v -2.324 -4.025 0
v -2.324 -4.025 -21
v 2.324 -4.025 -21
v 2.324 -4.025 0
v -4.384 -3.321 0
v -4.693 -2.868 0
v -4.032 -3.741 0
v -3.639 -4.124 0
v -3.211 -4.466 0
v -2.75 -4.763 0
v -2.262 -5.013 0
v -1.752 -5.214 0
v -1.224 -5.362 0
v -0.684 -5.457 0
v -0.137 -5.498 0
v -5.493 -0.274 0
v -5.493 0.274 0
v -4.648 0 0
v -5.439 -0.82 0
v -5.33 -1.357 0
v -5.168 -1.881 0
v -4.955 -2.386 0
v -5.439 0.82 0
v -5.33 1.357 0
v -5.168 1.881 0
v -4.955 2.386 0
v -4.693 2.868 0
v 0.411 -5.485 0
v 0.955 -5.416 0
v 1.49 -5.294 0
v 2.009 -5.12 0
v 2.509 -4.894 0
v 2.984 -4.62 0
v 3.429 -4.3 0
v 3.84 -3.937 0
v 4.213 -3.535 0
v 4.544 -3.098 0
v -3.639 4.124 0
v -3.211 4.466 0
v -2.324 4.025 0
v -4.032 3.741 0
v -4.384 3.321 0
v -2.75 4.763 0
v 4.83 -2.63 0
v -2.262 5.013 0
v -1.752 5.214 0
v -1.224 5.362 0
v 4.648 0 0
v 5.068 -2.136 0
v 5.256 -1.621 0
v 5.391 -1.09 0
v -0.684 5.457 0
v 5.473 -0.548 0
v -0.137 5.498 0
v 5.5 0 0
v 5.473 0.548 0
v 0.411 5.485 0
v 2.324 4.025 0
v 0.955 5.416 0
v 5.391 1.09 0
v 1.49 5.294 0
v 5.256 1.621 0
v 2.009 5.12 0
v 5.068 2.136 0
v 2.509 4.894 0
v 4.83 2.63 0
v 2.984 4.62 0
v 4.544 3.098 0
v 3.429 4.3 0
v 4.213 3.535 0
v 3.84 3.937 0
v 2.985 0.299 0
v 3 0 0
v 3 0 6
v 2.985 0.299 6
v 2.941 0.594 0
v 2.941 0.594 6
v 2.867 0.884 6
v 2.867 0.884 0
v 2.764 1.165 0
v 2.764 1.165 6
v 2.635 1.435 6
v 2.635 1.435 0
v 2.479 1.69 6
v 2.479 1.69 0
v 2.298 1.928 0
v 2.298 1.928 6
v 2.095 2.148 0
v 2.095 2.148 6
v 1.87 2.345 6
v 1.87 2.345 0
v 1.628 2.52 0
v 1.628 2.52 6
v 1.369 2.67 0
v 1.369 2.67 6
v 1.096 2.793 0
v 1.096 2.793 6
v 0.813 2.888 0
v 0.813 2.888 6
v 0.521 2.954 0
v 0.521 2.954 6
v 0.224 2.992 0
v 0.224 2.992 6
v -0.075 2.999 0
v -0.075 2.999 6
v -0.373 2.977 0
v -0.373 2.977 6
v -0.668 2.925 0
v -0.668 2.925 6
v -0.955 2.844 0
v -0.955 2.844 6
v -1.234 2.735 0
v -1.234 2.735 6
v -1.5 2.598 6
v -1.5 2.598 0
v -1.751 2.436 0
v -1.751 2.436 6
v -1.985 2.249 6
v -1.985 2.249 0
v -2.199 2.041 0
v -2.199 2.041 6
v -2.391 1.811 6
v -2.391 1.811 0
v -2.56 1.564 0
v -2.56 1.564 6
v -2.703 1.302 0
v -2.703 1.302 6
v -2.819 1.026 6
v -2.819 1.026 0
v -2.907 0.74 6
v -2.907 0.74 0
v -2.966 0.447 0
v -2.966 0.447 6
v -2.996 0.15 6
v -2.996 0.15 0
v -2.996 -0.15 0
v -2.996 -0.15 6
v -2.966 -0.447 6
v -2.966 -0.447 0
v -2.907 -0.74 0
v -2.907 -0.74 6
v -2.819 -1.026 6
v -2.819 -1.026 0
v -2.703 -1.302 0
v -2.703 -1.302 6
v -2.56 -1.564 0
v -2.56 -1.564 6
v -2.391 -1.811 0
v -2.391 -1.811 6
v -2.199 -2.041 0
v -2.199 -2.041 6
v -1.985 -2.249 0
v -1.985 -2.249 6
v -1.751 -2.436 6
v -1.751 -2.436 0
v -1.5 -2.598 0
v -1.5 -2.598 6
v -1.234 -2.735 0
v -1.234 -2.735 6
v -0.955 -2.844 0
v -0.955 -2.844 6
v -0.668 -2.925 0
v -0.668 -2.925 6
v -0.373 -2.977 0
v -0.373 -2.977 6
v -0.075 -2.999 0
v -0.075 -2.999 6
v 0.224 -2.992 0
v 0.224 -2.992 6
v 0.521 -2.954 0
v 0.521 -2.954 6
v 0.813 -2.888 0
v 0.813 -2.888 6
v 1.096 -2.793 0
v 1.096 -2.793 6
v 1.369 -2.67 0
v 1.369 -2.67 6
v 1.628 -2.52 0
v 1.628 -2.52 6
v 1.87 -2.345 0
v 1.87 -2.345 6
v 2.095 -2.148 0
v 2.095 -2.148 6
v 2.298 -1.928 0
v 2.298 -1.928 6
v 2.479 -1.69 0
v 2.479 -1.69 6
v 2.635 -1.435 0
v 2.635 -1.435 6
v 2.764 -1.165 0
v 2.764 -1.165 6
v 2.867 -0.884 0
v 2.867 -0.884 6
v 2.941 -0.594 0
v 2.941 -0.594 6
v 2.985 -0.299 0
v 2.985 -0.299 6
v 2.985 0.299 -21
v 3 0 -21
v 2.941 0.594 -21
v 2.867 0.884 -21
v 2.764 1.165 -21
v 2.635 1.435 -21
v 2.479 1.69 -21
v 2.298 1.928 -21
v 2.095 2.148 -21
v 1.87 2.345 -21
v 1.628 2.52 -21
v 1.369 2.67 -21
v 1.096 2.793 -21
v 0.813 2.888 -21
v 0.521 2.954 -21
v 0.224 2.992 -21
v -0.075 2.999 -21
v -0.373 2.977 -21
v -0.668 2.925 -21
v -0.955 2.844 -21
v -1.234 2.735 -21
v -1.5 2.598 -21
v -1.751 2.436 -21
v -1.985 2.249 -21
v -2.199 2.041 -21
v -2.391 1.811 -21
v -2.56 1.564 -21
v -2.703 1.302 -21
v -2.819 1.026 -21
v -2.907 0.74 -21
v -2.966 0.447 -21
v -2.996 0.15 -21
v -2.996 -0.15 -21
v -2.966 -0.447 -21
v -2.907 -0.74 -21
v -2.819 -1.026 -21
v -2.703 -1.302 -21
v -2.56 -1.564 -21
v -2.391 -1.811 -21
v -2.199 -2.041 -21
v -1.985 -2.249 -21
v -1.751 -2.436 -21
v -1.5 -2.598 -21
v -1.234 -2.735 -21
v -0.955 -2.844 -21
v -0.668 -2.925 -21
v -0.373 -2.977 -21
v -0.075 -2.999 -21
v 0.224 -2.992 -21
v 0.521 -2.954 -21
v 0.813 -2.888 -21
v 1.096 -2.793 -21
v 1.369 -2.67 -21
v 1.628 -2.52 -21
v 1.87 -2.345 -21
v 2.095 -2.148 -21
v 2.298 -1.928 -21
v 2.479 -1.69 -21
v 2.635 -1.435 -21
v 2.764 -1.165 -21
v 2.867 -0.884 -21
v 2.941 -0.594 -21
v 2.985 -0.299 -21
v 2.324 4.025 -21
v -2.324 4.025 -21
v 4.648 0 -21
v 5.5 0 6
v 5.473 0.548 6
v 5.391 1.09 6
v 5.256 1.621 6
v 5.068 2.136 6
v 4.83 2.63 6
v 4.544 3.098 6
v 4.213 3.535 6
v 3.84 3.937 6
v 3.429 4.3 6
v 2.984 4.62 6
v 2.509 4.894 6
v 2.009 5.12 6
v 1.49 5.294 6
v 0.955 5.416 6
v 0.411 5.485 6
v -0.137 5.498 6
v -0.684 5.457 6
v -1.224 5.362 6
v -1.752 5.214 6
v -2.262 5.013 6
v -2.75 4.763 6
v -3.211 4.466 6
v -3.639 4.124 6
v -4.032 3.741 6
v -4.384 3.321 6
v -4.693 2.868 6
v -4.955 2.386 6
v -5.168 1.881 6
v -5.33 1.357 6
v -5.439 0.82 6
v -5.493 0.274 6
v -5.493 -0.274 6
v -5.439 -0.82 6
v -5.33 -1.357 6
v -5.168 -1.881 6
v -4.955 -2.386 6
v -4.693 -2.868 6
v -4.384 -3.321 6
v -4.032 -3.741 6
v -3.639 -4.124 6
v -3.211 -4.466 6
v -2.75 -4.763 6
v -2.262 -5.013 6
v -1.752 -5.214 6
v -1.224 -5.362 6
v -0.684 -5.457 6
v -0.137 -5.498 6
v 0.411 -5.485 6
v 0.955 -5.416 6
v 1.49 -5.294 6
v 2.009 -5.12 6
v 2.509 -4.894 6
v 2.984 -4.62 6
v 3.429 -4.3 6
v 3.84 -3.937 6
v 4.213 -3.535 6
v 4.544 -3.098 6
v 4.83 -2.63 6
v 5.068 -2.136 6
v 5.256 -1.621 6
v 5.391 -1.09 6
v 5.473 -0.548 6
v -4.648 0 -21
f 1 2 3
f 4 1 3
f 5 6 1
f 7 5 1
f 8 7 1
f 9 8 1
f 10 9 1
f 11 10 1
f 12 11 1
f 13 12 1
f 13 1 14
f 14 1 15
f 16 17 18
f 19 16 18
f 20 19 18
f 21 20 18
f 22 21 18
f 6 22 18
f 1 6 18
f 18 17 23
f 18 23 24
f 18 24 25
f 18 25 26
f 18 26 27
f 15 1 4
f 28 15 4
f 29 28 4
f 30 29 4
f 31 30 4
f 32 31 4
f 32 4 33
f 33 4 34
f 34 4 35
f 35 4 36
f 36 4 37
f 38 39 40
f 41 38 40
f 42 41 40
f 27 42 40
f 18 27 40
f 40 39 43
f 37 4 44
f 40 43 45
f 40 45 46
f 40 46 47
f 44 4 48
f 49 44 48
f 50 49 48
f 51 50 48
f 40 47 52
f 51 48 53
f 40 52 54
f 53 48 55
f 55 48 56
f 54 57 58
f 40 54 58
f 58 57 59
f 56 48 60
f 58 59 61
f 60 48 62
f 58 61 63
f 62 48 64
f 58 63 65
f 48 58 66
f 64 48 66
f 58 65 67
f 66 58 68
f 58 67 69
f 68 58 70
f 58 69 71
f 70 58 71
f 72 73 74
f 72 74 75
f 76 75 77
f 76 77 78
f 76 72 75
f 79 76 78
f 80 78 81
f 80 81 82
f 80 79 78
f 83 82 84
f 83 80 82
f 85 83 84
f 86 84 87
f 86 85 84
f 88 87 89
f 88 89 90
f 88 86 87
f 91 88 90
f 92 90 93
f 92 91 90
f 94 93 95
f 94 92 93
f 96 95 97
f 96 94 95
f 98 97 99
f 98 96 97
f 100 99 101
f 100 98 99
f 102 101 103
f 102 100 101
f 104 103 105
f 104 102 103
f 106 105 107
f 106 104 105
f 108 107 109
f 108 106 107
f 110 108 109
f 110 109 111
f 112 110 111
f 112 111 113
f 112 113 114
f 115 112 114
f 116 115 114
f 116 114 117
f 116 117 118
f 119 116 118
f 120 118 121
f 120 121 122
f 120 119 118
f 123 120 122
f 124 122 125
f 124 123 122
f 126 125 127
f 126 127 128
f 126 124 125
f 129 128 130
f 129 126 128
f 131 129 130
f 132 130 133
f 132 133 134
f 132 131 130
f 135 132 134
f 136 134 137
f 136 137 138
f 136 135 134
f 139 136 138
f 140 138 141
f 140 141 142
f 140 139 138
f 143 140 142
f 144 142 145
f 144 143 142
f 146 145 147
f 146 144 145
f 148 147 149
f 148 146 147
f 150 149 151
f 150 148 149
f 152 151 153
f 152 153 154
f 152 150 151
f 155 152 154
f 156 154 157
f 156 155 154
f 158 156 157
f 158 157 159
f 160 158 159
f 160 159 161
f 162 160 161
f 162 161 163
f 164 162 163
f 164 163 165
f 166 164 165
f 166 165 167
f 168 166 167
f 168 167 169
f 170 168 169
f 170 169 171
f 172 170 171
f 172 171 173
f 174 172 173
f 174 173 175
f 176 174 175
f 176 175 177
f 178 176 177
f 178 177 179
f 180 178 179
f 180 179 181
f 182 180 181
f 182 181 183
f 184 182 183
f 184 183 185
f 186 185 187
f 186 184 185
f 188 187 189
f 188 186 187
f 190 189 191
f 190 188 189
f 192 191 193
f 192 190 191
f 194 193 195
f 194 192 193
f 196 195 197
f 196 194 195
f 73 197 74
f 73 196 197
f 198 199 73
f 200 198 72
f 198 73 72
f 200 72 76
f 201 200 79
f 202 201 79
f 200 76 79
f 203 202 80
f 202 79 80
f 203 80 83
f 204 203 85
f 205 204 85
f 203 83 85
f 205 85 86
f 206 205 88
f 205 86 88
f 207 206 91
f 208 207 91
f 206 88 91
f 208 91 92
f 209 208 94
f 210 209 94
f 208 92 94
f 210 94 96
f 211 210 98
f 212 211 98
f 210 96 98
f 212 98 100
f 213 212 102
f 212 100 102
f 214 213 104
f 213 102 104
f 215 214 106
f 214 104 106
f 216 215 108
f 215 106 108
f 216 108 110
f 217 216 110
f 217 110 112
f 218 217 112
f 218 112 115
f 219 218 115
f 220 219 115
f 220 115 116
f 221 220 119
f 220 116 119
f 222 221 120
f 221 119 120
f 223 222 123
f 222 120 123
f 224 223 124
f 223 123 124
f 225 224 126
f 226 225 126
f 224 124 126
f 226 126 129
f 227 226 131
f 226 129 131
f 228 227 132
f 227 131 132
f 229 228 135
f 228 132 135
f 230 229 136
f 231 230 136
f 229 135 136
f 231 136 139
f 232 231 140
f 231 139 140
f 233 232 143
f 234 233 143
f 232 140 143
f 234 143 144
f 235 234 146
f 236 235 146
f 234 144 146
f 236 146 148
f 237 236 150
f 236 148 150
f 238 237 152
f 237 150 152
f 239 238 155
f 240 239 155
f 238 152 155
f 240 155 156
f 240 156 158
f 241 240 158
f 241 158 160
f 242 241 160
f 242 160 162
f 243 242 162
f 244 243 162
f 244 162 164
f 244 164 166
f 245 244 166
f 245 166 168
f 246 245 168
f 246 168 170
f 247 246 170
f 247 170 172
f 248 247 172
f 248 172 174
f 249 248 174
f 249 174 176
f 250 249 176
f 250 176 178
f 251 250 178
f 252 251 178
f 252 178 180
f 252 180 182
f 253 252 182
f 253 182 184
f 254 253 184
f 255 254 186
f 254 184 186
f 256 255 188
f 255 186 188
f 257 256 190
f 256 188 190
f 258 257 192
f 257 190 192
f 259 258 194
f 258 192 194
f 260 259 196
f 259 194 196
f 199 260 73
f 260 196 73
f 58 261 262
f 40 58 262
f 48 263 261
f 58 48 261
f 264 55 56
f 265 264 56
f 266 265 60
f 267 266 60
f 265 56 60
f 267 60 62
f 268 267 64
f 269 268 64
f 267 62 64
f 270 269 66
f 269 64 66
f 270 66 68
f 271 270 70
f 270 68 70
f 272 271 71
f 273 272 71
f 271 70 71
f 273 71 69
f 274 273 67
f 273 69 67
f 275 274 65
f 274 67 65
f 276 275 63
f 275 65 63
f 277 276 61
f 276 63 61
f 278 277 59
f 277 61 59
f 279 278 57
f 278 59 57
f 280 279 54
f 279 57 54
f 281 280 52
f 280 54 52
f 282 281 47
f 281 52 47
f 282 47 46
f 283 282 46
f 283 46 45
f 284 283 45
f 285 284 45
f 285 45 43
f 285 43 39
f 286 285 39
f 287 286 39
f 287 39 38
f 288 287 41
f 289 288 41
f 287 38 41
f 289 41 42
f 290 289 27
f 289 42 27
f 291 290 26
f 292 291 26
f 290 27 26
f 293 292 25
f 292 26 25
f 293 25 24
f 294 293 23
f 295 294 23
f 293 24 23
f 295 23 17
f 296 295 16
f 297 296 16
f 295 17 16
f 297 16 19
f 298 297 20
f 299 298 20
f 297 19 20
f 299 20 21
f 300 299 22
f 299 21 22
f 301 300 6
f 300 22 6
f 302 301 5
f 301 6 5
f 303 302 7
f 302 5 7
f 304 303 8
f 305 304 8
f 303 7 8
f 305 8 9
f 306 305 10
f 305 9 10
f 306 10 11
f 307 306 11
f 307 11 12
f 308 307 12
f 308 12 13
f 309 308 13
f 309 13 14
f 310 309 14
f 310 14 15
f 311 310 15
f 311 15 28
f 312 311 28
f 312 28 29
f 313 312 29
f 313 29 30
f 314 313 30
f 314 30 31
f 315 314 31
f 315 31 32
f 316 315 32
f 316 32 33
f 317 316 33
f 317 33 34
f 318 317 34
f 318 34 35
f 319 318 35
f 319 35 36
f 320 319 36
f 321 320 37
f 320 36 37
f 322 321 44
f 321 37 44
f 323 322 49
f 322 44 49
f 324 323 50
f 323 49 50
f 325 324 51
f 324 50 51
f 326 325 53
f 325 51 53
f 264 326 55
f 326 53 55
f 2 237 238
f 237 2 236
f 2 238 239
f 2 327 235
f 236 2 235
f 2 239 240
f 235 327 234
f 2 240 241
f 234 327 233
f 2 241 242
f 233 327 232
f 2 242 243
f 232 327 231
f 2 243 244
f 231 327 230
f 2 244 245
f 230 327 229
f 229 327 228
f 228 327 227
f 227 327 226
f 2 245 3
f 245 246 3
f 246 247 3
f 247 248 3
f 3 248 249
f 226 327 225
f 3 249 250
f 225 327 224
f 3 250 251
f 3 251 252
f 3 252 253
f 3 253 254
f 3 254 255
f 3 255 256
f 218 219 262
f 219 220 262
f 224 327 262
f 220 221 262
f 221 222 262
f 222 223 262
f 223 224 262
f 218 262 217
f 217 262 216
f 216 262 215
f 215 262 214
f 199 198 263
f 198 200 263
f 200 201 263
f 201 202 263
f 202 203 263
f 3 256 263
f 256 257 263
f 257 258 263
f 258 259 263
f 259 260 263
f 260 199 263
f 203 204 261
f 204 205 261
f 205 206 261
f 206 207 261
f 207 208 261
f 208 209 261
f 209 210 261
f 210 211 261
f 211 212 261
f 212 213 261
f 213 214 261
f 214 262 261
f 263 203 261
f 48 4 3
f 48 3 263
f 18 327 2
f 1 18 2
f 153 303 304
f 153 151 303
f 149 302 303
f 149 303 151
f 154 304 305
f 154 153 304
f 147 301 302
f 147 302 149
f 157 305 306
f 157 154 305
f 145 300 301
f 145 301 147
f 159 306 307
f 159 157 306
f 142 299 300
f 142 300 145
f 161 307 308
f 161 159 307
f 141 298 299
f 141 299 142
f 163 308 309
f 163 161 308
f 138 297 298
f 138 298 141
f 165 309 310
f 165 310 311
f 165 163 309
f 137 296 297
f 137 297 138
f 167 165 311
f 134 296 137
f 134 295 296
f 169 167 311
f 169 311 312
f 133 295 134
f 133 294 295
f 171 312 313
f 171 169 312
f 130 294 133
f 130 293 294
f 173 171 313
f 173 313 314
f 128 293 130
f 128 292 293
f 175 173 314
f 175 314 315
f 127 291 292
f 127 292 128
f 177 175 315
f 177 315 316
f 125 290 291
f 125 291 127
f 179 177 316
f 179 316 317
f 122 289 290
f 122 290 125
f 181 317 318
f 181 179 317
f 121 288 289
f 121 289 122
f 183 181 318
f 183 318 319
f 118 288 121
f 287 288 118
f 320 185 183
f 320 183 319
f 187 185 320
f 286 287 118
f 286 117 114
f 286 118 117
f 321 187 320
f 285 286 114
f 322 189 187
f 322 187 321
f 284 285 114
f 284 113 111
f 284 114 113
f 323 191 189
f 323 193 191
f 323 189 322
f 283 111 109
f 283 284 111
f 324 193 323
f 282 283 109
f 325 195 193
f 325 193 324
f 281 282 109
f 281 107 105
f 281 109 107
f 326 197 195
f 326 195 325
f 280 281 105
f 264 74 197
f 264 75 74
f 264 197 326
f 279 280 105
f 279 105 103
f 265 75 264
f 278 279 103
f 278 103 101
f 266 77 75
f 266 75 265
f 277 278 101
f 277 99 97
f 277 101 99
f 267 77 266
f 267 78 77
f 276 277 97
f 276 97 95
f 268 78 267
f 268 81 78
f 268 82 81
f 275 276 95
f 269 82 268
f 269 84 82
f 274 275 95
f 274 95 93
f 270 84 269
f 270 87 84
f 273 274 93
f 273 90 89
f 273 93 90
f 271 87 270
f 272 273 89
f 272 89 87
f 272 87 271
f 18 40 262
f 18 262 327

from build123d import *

# Parameters (mm, degrees)
SKETCH_1_R      = 5.5
SKETCH_1_R_2    = 3
EXTRUDE_1_DEPTH = 6
EXTRUDE_START   = -21
SKETCH_1_3_R    = 3
EXTRUDE_2_DEPTH = 21


with BuildPart() as part:
    # 草图1 → 凸台-拉伸1 (new body)
    with BuildSketch(Plane.XY):
        Circle(SKETCH_1_R)
        Circle(SKETCH_1_R_2, mode=Mode.SUBTRACT)
    extrude(amount=EXTRUDE_1_DEPTH)

    # 草图1<3> → 凸台-拉伸2 (add)
    with BuildSketch(Plane.XY.offset(EXTRUDE_START)):
        Polygon((2.323834833, 4.025), (-2.323834833, 4.025), (-4.647669667, 0), (-2.323834833, -4.025), (2.323834833, -4.025), (4.647669667, 0), align=None)
        Circle(SKETCH_1_3_R, mode=Mode.SUBTRACT)
    extrude(amount=EXTRUDE_2_DEPTH)


solid = part.part
